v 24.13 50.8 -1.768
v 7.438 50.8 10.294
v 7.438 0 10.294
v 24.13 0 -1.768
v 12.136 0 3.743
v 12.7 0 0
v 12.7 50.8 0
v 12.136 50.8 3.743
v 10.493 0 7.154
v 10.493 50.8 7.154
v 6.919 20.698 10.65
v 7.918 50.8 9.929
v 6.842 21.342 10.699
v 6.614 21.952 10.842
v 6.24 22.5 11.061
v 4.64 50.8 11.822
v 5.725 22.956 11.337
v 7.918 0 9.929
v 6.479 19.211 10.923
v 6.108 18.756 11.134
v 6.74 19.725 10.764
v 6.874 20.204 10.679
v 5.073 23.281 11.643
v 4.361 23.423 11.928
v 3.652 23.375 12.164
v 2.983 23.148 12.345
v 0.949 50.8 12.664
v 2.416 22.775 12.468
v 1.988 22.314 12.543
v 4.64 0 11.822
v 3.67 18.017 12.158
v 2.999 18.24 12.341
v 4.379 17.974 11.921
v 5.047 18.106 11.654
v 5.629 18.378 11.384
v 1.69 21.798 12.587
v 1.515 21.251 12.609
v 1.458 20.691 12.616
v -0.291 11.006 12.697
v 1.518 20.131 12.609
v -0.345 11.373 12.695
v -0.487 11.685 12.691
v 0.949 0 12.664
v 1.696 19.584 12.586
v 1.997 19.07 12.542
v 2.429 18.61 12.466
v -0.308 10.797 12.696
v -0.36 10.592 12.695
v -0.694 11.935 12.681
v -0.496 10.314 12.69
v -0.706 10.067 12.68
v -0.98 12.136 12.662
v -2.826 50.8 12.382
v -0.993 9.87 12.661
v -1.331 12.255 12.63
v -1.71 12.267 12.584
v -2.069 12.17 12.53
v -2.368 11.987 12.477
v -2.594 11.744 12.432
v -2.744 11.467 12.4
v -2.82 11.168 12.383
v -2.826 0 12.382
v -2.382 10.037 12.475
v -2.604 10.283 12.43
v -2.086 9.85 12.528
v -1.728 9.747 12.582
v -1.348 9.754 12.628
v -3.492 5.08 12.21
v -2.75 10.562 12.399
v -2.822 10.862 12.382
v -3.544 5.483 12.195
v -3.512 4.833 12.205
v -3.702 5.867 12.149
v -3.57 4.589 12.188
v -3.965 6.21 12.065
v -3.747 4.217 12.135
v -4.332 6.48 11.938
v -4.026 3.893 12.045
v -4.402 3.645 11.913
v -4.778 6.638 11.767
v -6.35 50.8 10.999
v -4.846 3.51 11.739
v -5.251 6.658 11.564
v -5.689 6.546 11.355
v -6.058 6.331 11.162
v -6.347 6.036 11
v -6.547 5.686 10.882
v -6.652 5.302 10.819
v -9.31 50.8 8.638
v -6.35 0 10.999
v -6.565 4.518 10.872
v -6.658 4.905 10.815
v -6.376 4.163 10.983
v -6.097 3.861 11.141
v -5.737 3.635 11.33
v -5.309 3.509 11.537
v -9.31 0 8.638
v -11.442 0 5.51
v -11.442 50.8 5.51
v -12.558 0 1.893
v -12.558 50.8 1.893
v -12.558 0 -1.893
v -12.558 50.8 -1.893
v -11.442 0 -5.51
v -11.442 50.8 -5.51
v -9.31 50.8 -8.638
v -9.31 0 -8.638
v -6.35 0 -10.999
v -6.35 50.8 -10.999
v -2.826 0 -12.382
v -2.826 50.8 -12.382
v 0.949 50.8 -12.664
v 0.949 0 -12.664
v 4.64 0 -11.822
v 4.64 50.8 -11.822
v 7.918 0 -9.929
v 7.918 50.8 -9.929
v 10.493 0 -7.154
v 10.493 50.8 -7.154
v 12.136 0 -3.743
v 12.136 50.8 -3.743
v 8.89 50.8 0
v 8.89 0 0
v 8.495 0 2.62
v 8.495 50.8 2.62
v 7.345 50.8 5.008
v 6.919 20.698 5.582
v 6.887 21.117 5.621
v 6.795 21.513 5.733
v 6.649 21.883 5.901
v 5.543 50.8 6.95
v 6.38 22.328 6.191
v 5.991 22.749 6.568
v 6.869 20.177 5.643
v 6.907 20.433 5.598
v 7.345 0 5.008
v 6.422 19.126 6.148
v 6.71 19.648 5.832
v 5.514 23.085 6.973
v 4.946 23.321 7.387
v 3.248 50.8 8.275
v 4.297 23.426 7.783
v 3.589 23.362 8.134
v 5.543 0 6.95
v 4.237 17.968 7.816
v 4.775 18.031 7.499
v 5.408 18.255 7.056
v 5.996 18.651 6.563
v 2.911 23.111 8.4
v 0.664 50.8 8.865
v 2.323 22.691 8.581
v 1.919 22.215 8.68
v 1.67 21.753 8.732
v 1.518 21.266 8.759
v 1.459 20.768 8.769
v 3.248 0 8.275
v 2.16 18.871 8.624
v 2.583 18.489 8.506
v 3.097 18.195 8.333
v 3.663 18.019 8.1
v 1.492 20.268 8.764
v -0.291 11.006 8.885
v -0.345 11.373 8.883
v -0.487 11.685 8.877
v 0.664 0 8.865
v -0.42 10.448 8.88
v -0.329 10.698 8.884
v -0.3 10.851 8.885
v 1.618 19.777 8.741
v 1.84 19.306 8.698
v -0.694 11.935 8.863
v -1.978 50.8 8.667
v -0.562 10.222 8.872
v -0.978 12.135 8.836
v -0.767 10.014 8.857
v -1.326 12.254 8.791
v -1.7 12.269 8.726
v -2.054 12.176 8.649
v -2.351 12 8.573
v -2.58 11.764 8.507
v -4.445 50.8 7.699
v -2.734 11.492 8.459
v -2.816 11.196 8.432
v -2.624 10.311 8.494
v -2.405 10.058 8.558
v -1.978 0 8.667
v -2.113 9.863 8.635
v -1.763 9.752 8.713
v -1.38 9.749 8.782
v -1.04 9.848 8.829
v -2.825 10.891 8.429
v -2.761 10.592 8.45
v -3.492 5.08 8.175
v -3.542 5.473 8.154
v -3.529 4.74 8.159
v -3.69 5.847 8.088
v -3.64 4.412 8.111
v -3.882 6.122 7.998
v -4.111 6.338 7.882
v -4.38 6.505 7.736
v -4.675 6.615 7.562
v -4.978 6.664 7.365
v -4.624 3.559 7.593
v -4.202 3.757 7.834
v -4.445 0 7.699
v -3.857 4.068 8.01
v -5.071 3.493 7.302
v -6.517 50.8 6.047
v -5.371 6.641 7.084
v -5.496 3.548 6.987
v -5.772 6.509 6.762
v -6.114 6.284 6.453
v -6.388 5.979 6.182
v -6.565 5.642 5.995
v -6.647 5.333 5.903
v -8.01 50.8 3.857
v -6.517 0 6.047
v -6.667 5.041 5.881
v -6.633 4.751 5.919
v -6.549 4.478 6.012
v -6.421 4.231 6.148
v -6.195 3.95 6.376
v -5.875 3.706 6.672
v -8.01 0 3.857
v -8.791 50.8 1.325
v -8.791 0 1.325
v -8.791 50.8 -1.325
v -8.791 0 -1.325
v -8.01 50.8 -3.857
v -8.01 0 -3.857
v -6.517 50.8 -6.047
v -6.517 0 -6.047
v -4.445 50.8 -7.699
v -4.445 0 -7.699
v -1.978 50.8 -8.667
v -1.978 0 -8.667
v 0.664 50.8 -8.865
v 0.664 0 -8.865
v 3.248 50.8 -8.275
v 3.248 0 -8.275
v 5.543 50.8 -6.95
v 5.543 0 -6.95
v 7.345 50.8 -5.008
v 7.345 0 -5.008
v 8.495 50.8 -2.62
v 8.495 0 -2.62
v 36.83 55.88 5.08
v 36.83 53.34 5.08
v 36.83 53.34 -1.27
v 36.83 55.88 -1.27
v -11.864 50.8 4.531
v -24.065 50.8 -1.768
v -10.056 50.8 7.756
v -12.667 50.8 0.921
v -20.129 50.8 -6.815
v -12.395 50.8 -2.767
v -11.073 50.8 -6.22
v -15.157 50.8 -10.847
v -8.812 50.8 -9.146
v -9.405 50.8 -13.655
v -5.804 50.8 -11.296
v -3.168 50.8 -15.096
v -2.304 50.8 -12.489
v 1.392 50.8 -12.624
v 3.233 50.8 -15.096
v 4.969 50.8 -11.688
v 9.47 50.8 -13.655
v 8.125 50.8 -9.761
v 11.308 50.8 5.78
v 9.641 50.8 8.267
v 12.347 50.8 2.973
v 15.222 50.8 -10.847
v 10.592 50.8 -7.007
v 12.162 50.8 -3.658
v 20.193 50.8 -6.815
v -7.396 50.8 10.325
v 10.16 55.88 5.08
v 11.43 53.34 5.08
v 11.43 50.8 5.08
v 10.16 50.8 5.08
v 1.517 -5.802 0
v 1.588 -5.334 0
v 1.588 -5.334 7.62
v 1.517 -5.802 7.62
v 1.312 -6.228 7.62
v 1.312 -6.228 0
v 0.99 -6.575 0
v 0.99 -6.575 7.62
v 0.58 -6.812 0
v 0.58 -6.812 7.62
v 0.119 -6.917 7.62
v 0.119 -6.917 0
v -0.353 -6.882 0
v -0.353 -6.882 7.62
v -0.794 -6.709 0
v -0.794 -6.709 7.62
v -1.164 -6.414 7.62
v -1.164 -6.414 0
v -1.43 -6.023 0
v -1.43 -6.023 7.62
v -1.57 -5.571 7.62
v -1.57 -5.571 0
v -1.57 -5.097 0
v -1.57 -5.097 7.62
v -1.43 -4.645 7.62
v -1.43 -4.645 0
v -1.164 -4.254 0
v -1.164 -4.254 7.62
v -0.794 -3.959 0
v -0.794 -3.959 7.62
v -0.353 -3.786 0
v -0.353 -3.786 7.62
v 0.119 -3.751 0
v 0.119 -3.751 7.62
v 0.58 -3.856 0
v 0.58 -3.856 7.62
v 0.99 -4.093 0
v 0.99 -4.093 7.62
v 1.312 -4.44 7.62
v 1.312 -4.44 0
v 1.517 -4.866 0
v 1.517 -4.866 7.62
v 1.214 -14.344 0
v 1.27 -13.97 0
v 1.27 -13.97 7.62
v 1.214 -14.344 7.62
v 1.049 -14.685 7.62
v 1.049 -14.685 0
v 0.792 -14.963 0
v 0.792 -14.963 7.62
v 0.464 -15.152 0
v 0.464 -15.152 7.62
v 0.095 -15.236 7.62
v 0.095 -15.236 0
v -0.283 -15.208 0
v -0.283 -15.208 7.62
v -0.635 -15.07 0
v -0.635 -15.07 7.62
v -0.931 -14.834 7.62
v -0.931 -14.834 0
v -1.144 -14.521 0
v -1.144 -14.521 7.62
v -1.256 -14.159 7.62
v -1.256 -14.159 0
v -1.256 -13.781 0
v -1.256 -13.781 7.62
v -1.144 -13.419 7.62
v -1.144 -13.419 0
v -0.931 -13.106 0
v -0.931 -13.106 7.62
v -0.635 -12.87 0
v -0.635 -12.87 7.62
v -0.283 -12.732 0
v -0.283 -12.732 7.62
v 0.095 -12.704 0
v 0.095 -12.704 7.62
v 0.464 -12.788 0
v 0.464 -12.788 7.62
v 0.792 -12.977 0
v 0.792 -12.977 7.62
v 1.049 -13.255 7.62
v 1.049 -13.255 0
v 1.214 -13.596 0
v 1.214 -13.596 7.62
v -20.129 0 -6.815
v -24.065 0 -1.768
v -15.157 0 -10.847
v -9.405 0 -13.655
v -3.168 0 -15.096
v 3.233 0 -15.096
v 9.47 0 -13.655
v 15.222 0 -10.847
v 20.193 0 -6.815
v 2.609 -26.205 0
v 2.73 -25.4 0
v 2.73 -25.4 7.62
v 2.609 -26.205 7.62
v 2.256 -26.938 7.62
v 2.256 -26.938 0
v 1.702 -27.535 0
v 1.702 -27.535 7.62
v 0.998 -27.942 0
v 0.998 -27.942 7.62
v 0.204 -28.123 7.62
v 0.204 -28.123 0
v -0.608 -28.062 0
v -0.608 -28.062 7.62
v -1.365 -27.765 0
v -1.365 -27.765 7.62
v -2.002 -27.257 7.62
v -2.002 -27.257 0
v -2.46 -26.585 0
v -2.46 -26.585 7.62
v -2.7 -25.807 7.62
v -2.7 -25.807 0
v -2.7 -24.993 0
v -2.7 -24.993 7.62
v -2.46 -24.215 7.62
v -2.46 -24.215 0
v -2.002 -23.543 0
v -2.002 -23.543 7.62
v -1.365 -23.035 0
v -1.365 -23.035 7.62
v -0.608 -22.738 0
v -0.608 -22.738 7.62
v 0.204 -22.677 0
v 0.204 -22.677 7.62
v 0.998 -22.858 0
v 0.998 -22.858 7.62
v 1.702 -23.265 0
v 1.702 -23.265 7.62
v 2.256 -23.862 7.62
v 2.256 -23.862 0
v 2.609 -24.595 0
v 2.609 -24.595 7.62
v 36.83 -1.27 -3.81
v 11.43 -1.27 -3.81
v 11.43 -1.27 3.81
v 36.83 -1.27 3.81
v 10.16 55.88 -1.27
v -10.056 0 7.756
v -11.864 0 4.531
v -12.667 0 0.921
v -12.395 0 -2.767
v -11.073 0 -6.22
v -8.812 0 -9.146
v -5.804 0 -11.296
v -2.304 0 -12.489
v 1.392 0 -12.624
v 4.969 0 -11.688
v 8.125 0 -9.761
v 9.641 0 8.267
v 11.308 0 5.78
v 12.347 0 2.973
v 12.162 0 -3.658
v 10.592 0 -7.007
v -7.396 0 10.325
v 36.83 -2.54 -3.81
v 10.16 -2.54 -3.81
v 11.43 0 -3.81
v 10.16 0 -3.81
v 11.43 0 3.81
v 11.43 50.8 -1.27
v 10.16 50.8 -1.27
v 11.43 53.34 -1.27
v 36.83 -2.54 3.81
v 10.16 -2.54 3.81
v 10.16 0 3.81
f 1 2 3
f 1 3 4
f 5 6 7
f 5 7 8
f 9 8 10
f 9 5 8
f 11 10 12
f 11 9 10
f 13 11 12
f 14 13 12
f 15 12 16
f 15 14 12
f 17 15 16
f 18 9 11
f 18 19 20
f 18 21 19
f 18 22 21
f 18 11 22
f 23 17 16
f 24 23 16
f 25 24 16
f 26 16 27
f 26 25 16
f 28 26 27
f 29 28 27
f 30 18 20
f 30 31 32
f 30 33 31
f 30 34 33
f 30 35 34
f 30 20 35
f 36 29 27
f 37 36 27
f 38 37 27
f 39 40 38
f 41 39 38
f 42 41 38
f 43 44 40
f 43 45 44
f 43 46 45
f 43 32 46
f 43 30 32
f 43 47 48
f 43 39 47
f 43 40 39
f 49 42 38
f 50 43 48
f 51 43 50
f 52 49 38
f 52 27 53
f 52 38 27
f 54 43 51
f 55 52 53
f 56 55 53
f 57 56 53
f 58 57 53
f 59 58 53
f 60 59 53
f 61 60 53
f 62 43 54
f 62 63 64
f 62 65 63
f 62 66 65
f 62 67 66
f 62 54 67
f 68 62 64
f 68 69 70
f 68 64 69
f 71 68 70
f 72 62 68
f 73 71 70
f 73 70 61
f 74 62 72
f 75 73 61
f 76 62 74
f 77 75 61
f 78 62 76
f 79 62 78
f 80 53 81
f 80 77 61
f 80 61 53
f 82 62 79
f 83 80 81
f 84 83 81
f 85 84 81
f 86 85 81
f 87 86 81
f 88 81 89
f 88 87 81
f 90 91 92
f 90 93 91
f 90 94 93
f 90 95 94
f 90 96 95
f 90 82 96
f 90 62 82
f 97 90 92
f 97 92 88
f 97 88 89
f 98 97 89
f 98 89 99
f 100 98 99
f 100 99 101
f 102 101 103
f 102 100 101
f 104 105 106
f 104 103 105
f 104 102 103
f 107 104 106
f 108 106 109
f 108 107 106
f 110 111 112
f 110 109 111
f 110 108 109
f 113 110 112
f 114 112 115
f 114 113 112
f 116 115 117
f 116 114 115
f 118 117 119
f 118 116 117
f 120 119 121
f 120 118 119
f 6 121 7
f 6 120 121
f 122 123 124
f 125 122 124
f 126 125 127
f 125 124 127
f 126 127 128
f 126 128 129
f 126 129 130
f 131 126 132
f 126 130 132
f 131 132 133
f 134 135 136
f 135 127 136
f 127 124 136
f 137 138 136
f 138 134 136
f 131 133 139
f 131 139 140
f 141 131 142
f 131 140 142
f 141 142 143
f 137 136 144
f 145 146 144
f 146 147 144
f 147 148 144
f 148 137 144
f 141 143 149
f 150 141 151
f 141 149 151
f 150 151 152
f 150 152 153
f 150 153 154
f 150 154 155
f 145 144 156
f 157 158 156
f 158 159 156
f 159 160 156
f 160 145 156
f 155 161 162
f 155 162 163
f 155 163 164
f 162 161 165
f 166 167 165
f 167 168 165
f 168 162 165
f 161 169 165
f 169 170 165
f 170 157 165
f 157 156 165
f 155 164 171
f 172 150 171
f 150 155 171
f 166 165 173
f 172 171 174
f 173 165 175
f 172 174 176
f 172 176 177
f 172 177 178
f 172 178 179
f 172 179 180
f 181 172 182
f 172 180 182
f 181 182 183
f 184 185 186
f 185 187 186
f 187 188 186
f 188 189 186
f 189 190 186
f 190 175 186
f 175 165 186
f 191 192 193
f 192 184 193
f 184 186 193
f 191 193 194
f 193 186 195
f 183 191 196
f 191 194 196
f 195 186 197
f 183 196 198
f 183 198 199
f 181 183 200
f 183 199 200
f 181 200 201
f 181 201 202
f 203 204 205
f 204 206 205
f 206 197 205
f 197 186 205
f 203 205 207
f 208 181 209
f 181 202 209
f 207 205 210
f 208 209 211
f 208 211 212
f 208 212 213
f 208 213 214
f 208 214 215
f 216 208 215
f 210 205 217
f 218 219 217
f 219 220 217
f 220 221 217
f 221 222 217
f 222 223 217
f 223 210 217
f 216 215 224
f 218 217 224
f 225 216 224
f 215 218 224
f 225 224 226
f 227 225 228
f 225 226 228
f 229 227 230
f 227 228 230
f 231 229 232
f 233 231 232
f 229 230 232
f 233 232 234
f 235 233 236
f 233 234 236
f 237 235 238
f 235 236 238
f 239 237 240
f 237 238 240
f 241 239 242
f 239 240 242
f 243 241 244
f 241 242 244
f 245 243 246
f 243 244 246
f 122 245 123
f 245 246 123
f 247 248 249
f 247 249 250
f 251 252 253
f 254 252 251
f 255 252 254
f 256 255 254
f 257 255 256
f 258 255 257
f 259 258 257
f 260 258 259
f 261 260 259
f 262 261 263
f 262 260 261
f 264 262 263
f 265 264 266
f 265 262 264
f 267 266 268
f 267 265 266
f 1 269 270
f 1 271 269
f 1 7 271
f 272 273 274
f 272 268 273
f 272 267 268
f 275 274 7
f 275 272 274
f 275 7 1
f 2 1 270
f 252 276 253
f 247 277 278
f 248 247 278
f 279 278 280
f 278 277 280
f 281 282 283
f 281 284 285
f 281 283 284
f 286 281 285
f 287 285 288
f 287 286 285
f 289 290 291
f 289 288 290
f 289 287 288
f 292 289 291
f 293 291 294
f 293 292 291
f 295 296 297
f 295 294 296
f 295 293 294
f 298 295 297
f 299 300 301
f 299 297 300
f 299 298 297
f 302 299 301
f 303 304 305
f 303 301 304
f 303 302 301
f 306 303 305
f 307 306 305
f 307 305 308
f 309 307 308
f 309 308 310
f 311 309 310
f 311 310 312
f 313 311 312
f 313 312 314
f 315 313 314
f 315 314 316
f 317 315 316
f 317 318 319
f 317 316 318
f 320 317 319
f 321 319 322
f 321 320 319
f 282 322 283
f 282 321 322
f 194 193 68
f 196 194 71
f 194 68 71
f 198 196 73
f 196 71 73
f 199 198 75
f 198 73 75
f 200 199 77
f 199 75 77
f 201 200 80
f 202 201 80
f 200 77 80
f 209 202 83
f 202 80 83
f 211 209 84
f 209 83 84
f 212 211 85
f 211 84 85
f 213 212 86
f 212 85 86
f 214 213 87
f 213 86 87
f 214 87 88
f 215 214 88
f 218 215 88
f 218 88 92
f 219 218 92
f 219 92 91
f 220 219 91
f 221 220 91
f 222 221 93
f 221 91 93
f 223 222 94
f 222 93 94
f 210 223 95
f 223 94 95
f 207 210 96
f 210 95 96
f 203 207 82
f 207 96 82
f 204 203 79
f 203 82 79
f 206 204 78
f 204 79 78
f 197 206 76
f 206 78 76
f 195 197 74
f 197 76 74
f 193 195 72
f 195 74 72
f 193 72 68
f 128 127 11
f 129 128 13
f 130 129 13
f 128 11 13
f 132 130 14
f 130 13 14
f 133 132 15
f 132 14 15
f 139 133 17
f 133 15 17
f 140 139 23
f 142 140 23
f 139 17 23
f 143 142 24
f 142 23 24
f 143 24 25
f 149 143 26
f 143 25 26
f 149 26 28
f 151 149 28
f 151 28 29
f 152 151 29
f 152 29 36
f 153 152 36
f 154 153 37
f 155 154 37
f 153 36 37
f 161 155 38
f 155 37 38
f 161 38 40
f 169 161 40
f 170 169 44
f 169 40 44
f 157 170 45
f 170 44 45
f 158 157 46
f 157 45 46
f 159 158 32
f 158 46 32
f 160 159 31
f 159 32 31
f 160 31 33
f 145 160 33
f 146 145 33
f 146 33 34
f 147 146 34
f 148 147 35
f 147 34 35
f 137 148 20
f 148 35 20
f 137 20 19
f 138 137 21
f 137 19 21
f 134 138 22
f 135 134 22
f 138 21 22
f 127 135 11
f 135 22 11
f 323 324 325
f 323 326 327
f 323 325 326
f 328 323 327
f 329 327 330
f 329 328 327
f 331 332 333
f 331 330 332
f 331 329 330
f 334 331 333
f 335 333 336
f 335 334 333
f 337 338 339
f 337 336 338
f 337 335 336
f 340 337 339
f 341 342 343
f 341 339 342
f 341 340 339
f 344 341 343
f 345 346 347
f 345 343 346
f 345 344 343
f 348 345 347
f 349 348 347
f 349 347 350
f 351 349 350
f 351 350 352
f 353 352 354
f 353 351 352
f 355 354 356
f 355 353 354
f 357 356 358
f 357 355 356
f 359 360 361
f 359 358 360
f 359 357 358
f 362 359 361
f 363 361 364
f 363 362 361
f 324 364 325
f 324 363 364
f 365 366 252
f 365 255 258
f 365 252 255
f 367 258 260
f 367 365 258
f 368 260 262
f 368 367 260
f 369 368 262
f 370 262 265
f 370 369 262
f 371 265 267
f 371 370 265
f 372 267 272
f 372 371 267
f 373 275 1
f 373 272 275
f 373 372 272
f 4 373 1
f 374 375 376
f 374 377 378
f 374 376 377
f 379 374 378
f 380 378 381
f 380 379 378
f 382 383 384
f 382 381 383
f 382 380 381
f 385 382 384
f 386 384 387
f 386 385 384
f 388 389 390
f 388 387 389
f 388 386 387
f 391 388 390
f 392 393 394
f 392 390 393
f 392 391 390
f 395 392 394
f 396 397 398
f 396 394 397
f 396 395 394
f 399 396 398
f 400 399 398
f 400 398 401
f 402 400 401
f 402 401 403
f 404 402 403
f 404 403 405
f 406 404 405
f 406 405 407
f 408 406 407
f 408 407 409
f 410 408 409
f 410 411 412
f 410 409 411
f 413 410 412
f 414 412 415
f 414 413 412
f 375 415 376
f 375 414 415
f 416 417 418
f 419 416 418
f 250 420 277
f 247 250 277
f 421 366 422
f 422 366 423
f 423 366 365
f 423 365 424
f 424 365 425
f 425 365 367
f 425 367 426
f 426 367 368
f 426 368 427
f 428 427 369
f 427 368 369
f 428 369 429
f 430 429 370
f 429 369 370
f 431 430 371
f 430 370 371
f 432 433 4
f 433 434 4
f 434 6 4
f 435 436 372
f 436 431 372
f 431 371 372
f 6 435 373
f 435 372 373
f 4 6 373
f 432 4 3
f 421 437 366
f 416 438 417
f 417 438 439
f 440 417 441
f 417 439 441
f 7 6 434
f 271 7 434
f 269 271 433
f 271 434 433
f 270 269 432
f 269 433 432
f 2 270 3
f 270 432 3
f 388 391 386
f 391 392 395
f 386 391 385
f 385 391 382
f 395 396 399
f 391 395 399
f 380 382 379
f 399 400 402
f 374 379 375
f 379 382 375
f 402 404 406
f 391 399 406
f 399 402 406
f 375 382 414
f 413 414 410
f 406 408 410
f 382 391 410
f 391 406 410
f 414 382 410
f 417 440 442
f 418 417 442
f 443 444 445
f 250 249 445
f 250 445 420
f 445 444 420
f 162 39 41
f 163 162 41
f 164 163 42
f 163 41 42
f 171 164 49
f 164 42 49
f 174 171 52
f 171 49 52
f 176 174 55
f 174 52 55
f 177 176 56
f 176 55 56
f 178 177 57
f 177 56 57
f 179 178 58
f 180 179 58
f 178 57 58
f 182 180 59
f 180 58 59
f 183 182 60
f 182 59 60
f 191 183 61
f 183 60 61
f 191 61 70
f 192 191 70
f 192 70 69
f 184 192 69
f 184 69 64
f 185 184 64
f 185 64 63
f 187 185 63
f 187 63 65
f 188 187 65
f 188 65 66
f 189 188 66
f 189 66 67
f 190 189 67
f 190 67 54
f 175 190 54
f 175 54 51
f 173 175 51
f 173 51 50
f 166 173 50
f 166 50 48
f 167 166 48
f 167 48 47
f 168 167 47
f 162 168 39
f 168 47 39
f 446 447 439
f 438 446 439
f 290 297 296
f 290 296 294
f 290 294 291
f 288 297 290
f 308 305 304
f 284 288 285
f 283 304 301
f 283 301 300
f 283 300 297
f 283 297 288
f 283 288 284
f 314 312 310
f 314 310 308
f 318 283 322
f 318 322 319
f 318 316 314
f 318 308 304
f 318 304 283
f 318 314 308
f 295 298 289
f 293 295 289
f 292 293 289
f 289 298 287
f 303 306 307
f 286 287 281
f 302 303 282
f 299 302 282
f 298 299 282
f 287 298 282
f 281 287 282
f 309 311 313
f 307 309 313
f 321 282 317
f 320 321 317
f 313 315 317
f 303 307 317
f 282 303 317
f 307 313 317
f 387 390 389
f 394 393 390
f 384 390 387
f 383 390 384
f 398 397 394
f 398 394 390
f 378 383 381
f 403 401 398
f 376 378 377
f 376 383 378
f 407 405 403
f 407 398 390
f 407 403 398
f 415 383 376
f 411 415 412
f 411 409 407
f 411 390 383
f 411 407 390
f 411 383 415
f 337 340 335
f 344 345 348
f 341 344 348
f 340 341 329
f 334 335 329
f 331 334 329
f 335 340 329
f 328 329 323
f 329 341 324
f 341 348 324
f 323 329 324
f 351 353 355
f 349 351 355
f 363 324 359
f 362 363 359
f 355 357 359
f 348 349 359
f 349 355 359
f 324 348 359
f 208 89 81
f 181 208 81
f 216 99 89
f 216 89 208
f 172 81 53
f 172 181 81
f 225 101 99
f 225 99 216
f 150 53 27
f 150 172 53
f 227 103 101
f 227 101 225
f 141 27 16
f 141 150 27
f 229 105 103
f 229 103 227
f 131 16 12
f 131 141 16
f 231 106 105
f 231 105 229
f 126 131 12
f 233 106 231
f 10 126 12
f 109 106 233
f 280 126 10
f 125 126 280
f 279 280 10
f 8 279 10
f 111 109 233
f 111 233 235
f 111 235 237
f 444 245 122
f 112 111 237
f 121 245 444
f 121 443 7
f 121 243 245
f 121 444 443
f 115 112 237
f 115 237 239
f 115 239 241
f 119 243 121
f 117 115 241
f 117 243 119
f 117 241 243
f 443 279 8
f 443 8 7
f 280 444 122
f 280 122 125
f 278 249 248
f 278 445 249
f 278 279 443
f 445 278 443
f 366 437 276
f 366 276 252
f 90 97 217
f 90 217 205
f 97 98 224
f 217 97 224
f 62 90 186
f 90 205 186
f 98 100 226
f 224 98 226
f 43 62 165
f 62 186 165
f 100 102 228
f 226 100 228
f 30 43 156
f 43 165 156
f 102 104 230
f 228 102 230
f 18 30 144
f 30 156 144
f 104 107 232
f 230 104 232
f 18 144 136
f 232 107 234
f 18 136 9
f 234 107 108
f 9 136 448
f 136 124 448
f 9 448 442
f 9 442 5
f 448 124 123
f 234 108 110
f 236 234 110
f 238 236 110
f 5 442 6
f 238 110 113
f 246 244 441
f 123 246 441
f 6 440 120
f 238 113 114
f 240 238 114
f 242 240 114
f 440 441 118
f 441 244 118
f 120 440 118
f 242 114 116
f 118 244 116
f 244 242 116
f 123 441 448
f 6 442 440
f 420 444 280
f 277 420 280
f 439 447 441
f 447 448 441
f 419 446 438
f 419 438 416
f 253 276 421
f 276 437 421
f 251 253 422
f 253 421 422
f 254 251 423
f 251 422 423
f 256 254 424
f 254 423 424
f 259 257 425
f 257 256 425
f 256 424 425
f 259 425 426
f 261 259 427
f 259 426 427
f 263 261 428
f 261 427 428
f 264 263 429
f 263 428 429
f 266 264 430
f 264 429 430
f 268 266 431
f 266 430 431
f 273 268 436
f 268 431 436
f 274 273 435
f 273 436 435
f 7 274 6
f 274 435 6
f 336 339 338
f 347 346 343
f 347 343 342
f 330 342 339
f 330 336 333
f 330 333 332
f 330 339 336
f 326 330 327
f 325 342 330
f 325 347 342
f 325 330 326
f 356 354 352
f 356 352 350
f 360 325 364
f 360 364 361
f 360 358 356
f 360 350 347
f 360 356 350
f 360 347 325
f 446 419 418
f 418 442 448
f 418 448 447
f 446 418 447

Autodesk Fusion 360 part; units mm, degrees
sketch "Sketch1" plane through (0, 0, 0) normal (0, 1, 0) x (1, 0, 0)
  circle A0 centre (0, 0) radius 12.7
  dimension "d3" = 25.4
extrude "Extrude1" add sketch "Sketch1" along normal blind 50.8 makes body 1
sketch "Sketch2" plane through (0, 0, 0) normal (0, 1, 0) x (1, 0, 0)
  circle A0 centre (0, 0) radius 12.7
  line L0 (-7.3959, -10.3246) -> (-24.0652, 1.7679)
  arc A1 (24.13, 1.7679) -> (-24.0652, 1.7679) centre (0.0324, -12.9674) ccw
  line L1 (-26.7049, 1.7679) -> (33.02, 1.7679) construction
  line L2 (7.4384, -10.2937) -> (24.13, 1.7679)
  dimension "d6" = 25.4
  dimension "d7" = 24.13
  dimension "d8" = 24.13
extrude "Extrude2" add sketch "Sketch2" along normal blind 50.8 separate body contours A0 L0 A1 L2 makes body 2
sketch "Sketch3" plane through (0, 0, 0) normal (0, -1, 0) x (1, 0, 0)
  circle A0 centre (0, 0) radius 12.7
ref_plane "WorkPlane1" through (0, 0, 12.7) normal (0, 0, 1) x (1, 0, 0)
sketch "Sketch4" plane through (0, 0, 12.7) normal (0, 0, 1) x (1, 0, 0)
  circle A0 centre (-5.08, 5.08) radius 1.5875
  circle A1 centre (-1.5606, 11.0062) radius 1.27
  circle A2 centre (4.1889, 20.6981) radius 2.7305
  dimension "d29" = 3.175
  dimension "d30" = 2.54
  dimension "d31" = 5.461
extrude "Extrude3" cut sketch "Sketch4" against normal blind 7.62 contours A0 bodies 1
extrude "Extrude4" cut sketch "Sketch4" against normal blind 6.35 contours A1 bodies 1
extrude "Extrude5" cut sketch "Sketch4" against normal blind 8.89 contours A2 bodies 1
sketch "Sketch5" plane through (0, 0, 0) normal (0, -1, 0) x (1, 0, 0)
  circle A0 centre (0, 0) radius 8.89
  dimension "d18" = 17.78
extrude "Extrude6" cut sketch "Sketch5" against normal blind 71.12 bodies 1
sketch "Sketch6" plane through (0, 50.8, 0) normal (0, 1, 0) x (-1, 0, 0)
  circle A0 centre (0, 0) radius 8.89
  circle A1 centre (0, 0) radius 12.7
  line L0 (-11.43, -1.27) -> (-10.16, -1.27)
  line L1 (-10.16, -1.27) -> (-10.16, 5.08)
  line L2 (-10.16, 5.08) -> (-11.43, 5.08)
  line L3 (-11.43, 5.08) -> (-11.43, -1.27)
extrude "Extrude7" add sketch "Sketch6" along normal blind 5.08 contours L0 L1 L2 L3 bodies 1
sketch "Sketch7" plane through (11.43, 0, 0) normal (1, 0, 0) x (0, 1, 0)
  line L0 (50.8, 5.08) -> (50.8, -1.27)
  line L1 (50.8, -1.27) -> (55.88, -1.27)
  line L2 (55.88, -1.27) -> (55.88, 5.08)
  line L3 (55.88, 5.08) -> (50.8, 5.08)
  line L4 (53.34, 5.08) -> (55.88, 5.08)
  line L5 (55.88, 5.08) -> (55.88, -1.27)
  line L6 (55.88, -1.27) -> (53.34, -1.27)
  line L7 (53.34, -1.27) -> (53.34, 5.08)
extrude "Extrude8" add sketch "Sketch7" along normal blind 25.4 contours L1 L2 L3 L4 L5 L6 L7 bodies 1
sketch "Sketch8" plane through (0, 0, 0) normal (0, -1, 0) x (1, 0, 0)
  line L0 (10.16, -3.81) -> (11.43, -3.81)
  line L1 (11.43, -3.81) -> (11.43, 3.81)
  line L2 (11.43, 3.81) -> (10.16, 3.81)
  line L3 (10.16, 3.81) -> (10.16, -3.81)
extrude "Extrude9" add sketch "Sketch8" along normal blind 2.54 bodies 1
sketch "Sketch9" plane through (11.43, 0, 0) normal (1, 0, 0) x (0, 1, 0)
  line L0 (0, -3.81) -> (0, 3.81)
  line L1 (0, 3.81) -> (-2.54, 3.81)
  line L2 (-2.54, 3.81) -> (-2.54, -3.81)
  line L3 (-2.54, -3.81) -> (0, -3.81)
  line L4 (-1.27, 3.81) -> (-2.54, 3.81)
  line L5 (-2.54, 3.81) -> (-2.54, -3.81)
  line L6 (-2.54, -3.81) -> (-1.27, -3.81)
  line L7 (-1.27, -3.81) -> (-1.27, 3.81)
extrude "Extrude10" add sketch "Sketch9" along normal blind 25.4 contours L1 L2 L3 L4 L5 L6 L7 bodies 1
sketch "Sketch10" plane through (0, 0, 0) normal (1, 0, 0) x (0, 1, 0)
sketch "Sketch11" plane through (0, 0, 0) normal (0, 0, 1) x (1, 0, 0)
sketch "Sketch12" plane through (0, 0, 0) normal (0, 0, 1) x (1, 0, 0)
  circle A0 centre (0, -5.334) radius 1.5875
  dimension "d32" = 3.175
extrude "Extrude11" add sketch "Sketch12" along normal blind 7.62 separate body makes body 3
sketch "Sketch13" plane through (0, 0, 0) normal (0, 0, 1) x (1, 0, 0)
  circle A0 centre (0, -13.97) radius 1.27
  dimension "d35" = 2.54
extrude "Extrude12" add sketch "Sketch13" along normal blind 7.62 separate body makes body 4
sketch "Sketch14" plane through (0, 0, 0) normal (0, 0, 1) x (1, 0, 0)
  circle A0 centre (0, -25.4) radius 2.7305
  dimension "d38" = 5.461
extrude "Extrude13" add sketch "Sketch14" along normal blind 7.62 separate body makes body 5
sketch "Sketch15" plane through (0, 0, 0) normal (0, 1, 0) x (1, 0, 0)
  line L0 (-58.42, -15.24) -> (-15.24, -15.24) construction
  line L1 (-15.24, -15.24) -> (-15.24, -33.02) construction
  line L2 (-15.24, -33.02) -> (-58.42, -33.02) construction
  line L3 (-58.42, -33.02) -> (-58.42, -15.24) construction
  dimension "d41" = 10.0076
equation "depth = 2 in"
equation "dia = 1 in"
equation "d3 = dia"
equation "d4 = depth"
equation "d6 = dia"
equation "d9 = depth"
